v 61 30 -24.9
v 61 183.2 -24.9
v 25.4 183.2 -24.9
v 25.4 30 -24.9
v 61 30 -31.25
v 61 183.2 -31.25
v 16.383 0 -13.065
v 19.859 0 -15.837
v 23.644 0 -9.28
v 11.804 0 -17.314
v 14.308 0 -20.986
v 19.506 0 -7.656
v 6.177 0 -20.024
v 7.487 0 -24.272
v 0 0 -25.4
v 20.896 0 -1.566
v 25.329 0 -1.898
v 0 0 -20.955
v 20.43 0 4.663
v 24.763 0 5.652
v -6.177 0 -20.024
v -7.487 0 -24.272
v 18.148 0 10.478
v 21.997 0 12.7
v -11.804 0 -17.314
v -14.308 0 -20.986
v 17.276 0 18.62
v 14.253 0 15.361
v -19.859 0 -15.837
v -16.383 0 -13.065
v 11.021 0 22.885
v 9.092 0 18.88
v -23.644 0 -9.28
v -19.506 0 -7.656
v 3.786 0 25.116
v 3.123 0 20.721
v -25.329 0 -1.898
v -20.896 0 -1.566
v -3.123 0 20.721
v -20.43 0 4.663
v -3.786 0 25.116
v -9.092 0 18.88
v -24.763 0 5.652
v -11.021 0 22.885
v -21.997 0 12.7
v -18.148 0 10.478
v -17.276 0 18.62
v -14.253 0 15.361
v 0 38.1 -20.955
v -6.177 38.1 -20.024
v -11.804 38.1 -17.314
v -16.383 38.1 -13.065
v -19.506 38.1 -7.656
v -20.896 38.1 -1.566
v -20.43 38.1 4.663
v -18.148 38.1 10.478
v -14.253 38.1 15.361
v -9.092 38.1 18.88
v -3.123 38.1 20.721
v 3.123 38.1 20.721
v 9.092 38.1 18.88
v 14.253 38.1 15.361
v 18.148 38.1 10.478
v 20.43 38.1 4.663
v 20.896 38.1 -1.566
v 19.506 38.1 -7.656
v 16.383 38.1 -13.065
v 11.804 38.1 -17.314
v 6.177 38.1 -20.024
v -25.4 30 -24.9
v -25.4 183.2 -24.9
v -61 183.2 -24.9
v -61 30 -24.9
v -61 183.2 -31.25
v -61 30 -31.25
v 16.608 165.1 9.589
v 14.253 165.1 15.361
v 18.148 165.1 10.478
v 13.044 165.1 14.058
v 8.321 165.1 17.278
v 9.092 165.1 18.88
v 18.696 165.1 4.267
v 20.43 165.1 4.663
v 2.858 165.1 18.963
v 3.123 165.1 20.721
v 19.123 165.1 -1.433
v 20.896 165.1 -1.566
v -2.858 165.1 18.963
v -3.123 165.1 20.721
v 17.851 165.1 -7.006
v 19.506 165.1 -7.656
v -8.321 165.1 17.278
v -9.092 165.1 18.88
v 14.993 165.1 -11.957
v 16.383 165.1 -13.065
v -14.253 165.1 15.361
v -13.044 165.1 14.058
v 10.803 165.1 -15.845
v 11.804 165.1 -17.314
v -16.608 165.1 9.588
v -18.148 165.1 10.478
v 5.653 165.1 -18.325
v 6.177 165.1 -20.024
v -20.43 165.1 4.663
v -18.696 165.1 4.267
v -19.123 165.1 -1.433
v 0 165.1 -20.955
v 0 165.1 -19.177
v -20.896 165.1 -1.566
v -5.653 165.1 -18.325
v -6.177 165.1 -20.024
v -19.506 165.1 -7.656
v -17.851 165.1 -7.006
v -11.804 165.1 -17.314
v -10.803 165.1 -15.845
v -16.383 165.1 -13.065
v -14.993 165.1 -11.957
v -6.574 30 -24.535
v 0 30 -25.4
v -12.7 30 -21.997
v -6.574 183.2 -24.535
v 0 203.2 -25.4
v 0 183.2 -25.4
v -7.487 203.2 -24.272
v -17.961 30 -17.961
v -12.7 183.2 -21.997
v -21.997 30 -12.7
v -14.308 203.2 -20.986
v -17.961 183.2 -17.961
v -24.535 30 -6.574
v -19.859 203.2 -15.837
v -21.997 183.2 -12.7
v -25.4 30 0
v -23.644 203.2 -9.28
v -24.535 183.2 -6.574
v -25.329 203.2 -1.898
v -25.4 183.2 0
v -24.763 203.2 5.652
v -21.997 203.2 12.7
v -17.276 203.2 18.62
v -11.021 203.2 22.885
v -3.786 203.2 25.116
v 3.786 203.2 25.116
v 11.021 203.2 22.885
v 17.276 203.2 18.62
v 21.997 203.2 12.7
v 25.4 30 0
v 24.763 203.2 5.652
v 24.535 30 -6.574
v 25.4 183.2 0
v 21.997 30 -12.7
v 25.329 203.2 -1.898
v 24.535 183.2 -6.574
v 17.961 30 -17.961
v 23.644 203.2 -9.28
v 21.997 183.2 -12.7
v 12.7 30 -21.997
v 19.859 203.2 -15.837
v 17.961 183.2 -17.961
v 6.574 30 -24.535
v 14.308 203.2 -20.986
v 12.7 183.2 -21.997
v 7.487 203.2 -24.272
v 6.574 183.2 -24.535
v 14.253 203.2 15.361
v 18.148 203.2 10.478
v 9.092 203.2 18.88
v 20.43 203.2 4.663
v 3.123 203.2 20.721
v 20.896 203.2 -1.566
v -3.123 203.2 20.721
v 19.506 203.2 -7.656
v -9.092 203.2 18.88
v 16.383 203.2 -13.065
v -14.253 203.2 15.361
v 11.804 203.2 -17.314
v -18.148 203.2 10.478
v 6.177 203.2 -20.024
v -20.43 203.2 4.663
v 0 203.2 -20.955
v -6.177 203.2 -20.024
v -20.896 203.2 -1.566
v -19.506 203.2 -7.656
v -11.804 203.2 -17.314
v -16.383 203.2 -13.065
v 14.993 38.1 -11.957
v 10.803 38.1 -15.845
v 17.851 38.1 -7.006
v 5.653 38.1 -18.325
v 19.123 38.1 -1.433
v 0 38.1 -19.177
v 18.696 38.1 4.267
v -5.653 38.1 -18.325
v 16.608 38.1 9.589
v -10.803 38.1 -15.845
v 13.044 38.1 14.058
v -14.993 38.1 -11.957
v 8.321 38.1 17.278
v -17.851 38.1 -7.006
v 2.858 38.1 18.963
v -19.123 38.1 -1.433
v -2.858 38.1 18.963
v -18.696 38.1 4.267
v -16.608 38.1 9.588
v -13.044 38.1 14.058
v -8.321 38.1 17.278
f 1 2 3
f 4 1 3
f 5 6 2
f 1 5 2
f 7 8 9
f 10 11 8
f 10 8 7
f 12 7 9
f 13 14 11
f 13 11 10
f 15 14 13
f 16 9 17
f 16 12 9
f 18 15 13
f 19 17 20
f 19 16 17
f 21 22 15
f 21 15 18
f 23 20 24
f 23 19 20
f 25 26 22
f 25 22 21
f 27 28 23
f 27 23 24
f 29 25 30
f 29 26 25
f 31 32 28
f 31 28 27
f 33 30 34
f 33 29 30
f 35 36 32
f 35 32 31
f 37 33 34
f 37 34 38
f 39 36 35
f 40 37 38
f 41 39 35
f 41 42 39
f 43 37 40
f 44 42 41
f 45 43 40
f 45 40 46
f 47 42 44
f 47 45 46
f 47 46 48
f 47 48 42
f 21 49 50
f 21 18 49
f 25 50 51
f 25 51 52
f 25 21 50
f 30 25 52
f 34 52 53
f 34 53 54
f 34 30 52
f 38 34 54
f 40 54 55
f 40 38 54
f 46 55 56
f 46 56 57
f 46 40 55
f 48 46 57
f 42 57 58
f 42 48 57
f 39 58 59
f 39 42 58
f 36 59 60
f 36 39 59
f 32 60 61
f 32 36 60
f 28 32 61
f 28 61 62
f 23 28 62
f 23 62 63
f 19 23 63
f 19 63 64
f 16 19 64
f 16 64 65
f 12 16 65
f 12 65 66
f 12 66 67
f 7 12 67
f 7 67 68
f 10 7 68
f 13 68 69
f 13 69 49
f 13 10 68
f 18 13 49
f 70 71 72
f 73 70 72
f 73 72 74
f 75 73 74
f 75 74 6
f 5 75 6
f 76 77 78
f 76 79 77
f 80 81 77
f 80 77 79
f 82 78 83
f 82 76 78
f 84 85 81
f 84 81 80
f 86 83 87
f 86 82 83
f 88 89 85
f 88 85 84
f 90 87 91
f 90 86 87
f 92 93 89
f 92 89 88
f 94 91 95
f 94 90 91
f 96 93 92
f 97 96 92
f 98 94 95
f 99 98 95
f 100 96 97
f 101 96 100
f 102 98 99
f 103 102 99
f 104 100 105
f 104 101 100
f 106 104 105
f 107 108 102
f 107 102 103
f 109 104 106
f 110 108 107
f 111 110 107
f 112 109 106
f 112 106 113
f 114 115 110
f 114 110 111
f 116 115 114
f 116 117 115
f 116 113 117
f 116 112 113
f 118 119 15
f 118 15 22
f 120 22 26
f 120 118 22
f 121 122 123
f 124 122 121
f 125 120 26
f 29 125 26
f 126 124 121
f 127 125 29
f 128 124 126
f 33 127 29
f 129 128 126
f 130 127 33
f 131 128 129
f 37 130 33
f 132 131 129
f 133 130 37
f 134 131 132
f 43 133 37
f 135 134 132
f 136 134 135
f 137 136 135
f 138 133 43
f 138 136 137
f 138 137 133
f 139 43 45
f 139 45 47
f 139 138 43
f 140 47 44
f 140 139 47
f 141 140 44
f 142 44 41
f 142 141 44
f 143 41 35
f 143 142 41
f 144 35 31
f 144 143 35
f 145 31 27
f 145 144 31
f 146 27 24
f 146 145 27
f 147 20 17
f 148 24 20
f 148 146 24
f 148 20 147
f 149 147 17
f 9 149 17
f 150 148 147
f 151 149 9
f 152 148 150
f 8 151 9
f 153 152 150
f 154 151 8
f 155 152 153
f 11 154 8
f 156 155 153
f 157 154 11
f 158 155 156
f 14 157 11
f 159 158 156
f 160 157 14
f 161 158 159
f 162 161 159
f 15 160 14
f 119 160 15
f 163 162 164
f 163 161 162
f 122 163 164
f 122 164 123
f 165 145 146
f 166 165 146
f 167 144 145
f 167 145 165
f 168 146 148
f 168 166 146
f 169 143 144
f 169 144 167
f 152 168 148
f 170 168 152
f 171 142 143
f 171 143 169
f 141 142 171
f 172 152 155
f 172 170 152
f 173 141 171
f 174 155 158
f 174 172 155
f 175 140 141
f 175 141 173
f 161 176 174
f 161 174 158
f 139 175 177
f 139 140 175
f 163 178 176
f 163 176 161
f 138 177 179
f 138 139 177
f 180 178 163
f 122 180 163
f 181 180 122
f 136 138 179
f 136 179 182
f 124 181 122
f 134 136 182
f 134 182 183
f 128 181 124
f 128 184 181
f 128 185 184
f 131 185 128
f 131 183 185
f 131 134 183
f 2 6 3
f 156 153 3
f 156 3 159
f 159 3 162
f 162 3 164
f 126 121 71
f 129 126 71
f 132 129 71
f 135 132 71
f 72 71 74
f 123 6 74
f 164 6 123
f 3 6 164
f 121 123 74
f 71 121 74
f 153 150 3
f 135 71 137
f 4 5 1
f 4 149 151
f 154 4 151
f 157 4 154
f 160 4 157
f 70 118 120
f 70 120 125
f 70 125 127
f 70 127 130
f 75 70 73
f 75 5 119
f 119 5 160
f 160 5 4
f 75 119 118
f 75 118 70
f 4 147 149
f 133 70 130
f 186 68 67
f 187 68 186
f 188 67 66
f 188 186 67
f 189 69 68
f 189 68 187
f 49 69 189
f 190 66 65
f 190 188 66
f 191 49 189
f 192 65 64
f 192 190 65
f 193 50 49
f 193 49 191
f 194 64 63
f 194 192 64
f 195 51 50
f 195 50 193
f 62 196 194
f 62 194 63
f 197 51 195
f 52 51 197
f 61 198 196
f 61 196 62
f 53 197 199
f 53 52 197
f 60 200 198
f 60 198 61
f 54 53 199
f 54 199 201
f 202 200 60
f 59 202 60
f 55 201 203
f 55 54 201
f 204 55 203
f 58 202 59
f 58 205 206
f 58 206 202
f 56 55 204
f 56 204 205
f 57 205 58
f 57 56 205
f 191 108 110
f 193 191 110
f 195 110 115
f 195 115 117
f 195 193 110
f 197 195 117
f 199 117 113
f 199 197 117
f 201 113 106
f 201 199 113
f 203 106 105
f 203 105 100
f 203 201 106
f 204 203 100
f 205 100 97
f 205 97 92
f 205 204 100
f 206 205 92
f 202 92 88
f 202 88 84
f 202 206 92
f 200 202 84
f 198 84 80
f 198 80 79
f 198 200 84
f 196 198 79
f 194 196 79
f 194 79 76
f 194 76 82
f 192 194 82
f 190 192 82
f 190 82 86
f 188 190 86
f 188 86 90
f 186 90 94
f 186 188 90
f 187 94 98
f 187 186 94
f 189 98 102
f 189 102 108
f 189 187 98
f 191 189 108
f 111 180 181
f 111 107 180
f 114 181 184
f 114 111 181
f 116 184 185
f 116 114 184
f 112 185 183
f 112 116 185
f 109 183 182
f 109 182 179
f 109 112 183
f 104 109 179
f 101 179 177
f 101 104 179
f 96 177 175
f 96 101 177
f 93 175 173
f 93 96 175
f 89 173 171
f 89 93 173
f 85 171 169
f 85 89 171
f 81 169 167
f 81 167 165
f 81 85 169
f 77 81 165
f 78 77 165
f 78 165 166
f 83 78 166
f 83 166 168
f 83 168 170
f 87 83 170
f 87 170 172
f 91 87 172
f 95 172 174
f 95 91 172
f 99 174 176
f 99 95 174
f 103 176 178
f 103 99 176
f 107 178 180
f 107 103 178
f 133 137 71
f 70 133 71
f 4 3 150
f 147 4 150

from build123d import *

# Parameters (mm, degrees)
BOSS_EXTRUDE1_START = -153.2
BOSS_EXTRUDE1_DEPTH = 153.2


with BuildPart() as part:
    # Sketch12 → Revolve1 (revolve)
    with BuildSketch(Plane.XY, mode=Mode.PRIVATE) as revolve1_sk:
        Polygon((-25.399999994, 0), (-25.399999994, 203.2), (-20.955, 203.2), (-20.955, 165.1), (-19.177, 165.1), (-19.177, 38.1), (-20.955, 38.1), (-20.955, 0), align=None)
    revolve(revolve1_sk.sketch.rotate(Axis((0, 0, 0), (0, 1, 0)), 270), axis=Axis((0, 0, 0), (0, 1, 0)))

    # Sketch13 → Boss-Extrude1 (add)
    with BuildSketch(Plane(origin=(0, 30, 0), x_dir=(-1, 0, 0), z_dir=(0, -1, 0)).offset(BOSS_EXTRUDE1_START)):
        with BuildLine():
            Line((61, 24.899999994), (61, 31.249999994))
            Line((61, 31.249999994), (-61, 31.249999994))
            Line((-61, 31.249999994), (-61, 24.899999994))
            Line((-61, 24.899999994), (-25.399999994, 24.899999994))
            Line((-25.399999994, 24.899999994), (-25.399999994, 0))
            ThreePointArc((-25.399999994, 0), (0, 25.399999994), (25.399999994, 0))
            Line((25.399999994, 0), (25.399999994, 24.899999994))
            Line((25.399999994, 24.899999994), (61, 24.899999994))
        make_face()
    extrude(amount=BOSS_EXTRUDE1_DEPTH)


solid = part.part
